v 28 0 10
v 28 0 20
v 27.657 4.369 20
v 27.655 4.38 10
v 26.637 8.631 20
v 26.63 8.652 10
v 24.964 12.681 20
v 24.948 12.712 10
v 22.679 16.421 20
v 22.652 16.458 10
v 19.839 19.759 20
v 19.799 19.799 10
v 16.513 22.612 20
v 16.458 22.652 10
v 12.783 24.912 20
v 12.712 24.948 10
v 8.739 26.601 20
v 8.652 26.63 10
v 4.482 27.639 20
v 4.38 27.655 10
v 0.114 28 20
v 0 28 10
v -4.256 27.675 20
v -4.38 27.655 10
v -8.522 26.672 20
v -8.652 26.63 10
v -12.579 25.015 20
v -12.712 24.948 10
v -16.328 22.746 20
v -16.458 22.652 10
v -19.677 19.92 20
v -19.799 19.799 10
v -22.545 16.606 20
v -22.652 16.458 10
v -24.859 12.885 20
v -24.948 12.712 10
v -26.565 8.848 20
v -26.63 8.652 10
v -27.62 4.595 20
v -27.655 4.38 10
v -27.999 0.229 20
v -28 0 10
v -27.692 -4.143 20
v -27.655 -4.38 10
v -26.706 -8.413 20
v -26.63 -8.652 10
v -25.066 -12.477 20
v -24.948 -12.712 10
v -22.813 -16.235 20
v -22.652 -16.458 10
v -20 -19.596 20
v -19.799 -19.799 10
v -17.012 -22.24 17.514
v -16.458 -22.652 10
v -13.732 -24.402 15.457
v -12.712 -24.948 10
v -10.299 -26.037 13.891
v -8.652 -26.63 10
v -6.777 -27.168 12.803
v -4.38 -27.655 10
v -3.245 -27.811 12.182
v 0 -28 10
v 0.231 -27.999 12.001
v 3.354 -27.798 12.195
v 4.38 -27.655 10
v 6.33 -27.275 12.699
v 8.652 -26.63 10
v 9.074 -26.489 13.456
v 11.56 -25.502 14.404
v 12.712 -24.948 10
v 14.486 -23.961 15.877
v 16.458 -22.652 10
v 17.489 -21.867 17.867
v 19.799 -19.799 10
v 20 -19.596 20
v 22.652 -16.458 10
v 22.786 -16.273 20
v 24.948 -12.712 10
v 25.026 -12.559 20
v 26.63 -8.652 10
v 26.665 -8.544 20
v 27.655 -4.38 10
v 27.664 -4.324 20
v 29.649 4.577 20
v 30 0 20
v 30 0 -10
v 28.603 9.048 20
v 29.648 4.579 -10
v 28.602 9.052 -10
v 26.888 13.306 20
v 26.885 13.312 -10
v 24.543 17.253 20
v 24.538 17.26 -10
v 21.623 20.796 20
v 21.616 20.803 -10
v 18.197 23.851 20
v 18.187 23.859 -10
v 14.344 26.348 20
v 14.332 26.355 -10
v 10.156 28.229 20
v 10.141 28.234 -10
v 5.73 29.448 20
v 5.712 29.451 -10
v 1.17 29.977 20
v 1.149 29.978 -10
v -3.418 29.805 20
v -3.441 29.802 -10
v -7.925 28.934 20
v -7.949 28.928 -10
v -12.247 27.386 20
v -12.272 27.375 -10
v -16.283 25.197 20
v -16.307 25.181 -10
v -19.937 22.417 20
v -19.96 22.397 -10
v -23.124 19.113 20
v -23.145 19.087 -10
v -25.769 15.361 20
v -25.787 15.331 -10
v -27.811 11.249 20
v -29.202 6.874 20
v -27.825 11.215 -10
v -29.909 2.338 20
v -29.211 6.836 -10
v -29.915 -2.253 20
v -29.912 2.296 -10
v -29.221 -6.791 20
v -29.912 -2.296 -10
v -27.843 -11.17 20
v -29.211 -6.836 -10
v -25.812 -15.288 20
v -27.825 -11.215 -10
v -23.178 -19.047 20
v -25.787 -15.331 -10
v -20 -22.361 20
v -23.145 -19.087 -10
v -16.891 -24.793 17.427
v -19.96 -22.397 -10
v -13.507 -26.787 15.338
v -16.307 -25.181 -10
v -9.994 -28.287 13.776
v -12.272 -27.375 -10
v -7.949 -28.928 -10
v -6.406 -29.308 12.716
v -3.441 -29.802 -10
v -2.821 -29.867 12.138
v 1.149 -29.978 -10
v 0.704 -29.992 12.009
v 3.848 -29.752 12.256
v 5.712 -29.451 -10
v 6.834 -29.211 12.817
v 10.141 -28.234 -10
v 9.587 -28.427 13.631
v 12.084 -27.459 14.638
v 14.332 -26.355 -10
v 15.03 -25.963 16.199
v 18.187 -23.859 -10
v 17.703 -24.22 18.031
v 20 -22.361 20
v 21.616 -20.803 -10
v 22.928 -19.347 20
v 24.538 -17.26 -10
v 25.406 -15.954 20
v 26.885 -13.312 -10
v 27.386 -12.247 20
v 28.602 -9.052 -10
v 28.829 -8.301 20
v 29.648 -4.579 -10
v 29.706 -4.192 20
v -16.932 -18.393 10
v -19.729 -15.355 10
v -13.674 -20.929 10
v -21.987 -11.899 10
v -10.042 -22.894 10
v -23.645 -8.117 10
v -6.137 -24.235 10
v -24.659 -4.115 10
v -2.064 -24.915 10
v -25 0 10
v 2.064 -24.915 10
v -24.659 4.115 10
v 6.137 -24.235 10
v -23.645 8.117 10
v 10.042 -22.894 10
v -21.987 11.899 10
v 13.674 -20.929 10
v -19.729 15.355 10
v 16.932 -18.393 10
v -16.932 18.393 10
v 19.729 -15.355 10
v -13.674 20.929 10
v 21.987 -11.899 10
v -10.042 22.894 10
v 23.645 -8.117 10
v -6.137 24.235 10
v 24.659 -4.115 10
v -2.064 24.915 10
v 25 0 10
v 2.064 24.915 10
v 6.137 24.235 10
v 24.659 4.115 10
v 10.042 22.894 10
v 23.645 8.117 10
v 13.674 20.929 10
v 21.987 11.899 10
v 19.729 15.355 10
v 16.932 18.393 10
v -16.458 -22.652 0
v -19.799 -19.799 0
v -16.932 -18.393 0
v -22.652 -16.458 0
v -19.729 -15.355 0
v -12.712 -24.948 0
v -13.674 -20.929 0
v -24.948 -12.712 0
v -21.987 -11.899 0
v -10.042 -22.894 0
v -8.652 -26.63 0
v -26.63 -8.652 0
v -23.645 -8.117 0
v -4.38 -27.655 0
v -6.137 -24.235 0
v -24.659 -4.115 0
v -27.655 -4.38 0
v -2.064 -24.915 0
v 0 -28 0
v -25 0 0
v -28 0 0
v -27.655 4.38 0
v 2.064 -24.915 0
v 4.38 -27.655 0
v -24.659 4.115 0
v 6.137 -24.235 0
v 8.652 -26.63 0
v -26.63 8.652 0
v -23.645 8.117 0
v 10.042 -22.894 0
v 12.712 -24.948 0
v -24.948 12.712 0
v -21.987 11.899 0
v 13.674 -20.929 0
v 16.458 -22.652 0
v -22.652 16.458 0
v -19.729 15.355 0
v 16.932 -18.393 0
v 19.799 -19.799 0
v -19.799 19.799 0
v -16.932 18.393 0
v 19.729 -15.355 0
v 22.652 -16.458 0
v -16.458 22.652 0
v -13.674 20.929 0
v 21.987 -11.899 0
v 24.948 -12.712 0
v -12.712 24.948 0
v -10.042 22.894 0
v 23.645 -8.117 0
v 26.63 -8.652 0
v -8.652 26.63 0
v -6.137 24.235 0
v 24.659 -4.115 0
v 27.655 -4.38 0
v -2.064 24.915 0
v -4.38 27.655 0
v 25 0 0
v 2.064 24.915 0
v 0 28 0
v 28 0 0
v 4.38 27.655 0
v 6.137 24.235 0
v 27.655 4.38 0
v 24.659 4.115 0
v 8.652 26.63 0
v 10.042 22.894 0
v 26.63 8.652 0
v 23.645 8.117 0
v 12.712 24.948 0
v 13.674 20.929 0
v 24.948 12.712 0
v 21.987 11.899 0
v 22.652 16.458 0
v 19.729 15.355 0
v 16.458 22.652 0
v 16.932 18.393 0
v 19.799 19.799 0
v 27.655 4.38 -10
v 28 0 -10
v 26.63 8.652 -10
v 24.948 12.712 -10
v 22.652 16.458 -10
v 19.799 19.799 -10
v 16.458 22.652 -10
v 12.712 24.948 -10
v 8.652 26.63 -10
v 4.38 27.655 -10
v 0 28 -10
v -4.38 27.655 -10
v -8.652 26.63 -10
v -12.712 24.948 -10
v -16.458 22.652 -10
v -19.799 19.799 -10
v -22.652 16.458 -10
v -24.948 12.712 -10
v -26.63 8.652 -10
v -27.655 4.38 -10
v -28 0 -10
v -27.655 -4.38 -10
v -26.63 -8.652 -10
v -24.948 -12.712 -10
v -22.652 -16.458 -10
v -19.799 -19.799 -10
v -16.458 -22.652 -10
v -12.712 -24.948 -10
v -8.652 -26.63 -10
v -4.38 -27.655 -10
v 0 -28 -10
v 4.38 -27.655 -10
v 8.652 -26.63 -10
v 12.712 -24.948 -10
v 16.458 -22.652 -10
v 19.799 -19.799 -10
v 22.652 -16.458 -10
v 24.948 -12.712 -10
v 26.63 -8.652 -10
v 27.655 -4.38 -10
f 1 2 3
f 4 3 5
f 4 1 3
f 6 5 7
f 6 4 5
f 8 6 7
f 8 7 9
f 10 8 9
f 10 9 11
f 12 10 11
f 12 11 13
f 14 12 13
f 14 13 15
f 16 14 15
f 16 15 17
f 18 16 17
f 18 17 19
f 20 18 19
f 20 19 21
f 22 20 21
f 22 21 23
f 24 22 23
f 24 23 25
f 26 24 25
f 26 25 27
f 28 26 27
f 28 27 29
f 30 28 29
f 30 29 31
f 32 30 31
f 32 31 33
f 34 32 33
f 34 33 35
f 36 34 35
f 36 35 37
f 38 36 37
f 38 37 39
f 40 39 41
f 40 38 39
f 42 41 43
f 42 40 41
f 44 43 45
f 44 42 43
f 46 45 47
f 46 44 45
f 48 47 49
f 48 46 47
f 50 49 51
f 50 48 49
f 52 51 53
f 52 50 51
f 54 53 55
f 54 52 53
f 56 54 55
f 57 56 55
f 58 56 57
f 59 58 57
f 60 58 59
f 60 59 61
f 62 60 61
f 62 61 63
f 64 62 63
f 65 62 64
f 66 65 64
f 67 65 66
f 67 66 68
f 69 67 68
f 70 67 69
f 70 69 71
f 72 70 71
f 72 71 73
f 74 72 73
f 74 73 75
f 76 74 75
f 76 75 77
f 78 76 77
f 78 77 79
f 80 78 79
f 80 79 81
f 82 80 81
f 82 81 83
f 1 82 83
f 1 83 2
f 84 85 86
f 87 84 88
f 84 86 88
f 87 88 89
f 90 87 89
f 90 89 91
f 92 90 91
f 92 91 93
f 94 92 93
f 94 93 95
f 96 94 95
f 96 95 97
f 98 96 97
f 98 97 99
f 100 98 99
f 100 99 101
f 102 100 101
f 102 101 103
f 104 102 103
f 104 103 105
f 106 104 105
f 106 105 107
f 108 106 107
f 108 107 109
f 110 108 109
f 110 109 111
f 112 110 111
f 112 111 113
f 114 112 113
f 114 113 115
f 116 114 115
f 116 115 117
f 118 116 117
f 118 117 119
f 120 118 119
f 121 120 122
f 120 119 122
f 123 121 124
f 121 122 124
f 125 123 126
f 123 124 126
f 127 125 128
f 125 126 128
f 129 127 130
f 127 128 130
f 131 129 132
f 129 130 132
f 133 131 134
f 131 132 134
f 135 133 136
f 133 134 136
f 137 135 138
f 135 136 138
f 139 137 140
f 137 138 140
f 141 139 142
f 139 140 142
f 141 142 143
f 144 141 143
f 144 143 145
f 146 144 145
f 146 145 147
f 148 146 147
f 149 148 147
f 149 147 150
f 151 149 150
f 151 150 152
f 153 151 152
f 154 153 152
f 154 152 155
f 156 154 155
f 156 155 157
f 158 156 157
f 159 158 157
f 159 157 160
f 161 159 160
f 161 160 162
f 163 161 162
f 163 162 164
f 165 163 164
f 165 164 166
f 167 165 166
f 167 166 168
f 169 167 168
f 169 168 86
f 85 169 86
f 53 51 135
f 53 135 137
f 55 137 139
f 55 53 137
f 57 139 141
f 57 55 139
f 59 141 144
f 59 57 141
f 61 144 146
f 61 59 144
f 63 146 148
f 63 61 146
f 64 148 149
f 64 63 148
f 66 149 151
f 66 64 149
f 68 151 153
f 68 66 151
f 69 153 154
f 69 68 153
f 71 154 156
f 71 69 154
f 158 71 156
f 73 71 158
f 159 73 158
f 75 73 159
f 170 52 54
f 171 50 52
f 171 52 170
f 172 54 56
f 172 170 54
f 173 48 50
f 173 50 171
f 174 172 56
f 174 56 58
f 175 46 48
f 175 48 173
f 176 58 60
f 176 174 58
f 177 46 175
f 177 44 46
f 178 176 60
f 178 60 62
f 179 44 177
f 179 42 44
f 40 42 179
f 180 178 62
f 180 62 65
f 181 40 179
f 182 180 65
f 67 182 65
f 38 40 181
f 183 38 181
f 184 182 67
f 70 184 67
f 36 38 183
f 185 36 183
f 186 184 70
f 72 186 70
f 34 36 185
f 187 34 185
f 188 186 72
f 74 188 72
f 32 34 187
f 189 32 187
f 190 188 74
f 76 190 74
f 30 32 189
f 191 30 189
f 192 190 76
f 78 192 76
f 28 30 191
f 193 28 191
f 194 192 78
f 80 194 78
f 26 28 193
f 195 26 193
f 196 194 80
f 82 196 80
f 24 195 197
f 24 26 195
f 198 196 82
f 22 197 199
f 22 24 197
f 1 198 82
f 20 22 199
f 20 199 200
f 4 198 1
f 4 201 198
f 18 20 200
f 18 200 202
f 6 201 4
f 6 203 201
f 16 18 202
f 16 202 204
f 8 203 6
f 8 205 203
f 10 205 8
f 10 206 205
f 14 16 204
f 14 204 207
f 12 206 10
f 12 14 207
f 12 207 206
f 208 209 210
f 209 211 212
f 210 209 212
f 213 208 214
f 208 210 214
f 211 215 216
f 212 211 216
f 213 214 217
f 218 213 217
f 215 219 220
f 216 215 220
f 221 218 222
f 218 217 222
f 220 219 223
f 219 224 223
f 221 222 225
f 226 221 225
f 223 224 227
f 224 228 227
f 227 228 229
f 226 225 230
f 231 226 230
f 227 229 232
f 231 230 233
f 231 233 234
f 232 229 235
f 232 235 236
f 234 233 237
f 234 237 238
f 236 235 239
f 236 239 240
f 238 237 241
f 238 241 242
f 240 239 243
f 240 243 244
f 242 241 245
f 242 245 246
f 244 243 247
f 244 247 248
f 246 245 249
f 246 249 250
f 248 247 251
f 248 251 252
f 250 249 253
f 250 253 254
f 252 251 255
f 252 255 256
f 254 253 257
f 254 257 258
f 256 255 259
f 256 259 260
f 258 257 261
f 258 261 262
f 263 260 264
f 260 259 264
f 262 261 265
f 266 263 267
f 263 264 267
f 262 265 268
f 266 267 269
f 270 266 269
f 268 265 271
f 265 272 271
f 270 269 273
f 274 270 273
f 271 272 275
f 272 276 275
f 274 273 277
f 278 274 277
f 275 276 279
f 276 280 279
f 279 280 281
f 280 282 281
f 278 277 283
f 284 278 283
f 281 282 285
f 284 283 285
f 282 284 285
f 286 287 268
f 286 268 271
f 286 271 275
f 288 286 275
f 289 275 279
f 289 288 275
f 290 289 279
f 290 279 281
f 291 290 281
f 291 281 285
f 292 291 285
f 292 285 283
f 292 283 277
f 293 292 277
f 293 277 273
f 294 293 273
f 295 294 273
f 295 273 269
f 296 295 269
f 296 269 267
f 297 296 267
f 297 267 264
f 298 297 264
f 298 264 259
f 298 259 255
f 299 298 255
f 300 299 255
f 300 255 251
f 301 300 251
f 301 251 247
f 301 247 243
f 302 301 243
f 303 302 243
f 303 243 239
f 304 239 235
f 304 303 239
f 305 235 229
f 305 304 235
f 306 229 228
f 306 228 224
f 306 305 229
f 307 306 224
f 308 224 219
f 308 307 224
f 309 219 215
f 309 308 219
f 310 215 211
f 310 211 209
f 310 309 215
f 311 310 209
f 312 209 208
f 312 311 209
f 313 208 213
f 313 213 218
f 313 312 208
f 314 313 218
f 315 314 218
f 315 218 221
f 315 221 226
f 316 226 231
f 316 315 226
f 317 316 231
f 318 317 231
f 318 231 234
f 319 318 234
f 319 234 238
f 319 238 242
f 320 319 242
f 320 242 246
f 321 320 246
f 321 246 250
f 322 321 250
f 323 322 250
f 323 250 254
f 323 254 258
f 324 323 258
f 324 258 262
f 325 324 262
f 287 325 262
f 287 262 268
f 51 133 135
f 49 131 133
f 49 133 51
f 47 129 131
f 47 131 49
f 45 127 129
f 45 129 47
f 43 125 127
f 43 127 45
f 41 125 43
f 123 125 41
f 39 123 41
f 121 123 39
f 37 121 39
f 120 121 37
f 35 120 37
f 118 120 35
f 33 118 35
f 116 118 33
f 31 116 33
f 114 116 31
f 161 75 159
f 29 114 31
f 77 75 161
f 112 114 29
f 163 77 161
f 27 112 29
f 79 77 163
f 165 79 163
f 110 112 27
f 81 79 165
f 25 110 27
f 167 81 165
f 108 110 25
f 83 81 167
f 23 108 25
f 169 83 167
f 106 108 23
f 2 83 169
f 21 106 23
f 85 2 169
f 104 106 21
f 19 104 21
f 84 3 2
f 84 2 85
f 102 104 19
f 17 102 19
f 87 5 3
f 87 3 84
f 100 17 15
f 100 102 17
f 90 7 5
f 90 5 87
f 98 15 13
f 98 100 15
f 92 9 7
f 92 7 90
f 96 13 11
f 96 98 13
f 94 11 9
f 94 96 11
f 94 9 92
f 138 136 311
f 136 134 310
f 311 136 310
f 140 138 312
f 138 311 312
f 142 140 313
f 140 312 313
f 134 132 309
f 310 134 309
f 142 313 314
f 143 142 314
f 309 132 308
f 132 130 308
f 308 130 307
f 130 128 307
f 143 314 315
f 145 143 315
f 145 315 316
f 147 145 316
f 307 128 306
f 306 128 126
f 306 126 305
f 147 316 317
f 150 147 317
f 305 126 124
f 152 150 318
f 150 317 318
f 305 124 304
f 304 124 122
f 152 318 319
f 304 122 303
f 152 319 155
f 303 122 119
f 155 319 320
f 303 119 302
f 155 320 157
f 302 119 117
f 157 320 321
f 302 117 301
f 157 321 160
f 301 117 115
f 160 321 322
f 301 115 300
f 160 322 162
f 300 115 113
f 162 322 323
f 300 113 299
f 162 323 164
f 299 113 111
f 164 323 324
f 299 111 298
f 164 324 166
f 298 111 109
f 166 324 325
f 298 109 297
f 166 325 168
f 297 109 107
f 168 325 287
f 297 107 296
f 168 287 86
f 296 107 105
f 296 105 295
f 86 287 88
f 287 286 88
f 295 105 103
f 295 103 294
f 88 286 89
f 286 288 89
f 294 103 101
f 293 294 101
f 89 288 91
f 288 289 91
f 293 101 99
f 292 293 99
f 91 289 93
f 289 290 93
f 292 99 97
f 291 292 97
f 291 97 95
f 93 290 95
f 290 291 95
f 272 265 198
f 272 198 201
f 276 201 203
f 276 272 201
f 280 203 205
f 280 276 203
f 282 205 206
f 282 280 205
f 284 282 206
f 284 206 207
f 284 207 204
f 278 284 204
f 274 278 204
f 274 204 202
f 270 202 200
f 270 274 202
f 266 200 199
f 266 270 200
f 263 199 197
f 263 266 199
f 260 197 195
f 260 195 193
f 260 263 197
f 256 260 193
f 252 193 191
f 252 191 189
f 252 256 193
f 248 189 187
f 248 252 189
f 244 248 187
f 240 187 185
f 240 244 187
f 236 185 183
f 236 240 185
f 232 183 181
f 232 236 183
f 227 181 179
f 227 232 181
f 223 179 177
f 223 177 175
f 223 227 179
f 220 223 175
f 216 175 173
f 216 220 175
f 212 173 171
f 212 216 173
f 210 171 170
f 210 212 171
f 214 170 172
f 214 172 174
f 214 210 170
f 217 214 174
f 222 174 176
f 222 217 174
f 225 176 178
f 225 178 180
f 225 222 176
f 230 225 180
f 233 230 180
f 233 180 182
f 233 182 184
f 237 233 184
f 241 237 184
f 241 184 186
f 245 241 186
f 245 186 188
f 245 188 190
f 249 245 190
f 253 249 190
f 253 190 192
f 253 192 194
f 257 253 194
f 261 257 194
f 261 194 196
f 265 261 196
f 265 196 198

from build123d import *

# Parameters (mm, degrees)
CYLINDER099_R     = 29
CYLINDER099_DEPTH = 46
CYLINDER097_R     = 28
CYLINDER097_DEPTH = 30
CYLINDER098_R     = 30
CYLINDER098_DEPTH = 30
CYLINDER095_R     = 25
CYLINDER095_DEPTH = 10
CYLINDER096_R     = 28
CYLINDER096_DEPTH = 10


with BuildPart() as cylinder099:
    # Cylinder099 → Cylinder099 (new body)
    with BuildSketch(Plane(origin=(0, 0, 41), x_dir=(1, 0, 0), z_dir=(0, -1, 0))):
        Circle(CYLINDER099_R)
    extrude(amount=CYLINDER099_DEPTH)


with BuildPart() as cylinder097:
    # Cylinder097 → Cylinder097 (new body)
    with BuildSketch(Plane.XY.offset(-10)):
        Circle(CYLINDER097_R)
    extrude(amount=CYLINDER097_DEPTH)


with BuildPart() as cut103:
    # Cylinder098 → Cylinder098 (new body)
    with BuildSketch(Plane.XY.offset(-10)):
        Circle(CYLINDER098_R)
    extrude(amount=CYLINDER098_DEPTH)

    # Cut103: cut Cylinder097
    add(cylinder097.part, mode=Mode.SUBTRACT)


with BuildPart() as cylinder095:
    # Cylinder095 → Cylinder095 (new body)
    with BuildSketch(Plane.XY):
        Circle(CYLINDER095_R)
    extrude(amount=CYLINDER095_DEPTH)


with BuildPart() as cut104:
    # Cylinder096 → Cylinder096 (new body)
    with BuildSketch(Plane.XY):
        Circle(CYLINDER096_R)
    extrude(amount=CYLINDER096_DEPTH)

    # Cut102: cut Cylinder095
    add(cylinder095.part, mode=Mode.SUBTRACT)

    # Fusion029: union Cut103
    add(cut103.part)

    # Cut104: cut Cylinder099
    add(cylinder099.part, mode=Mode.SUBTRACT)


solid = cut104.part
